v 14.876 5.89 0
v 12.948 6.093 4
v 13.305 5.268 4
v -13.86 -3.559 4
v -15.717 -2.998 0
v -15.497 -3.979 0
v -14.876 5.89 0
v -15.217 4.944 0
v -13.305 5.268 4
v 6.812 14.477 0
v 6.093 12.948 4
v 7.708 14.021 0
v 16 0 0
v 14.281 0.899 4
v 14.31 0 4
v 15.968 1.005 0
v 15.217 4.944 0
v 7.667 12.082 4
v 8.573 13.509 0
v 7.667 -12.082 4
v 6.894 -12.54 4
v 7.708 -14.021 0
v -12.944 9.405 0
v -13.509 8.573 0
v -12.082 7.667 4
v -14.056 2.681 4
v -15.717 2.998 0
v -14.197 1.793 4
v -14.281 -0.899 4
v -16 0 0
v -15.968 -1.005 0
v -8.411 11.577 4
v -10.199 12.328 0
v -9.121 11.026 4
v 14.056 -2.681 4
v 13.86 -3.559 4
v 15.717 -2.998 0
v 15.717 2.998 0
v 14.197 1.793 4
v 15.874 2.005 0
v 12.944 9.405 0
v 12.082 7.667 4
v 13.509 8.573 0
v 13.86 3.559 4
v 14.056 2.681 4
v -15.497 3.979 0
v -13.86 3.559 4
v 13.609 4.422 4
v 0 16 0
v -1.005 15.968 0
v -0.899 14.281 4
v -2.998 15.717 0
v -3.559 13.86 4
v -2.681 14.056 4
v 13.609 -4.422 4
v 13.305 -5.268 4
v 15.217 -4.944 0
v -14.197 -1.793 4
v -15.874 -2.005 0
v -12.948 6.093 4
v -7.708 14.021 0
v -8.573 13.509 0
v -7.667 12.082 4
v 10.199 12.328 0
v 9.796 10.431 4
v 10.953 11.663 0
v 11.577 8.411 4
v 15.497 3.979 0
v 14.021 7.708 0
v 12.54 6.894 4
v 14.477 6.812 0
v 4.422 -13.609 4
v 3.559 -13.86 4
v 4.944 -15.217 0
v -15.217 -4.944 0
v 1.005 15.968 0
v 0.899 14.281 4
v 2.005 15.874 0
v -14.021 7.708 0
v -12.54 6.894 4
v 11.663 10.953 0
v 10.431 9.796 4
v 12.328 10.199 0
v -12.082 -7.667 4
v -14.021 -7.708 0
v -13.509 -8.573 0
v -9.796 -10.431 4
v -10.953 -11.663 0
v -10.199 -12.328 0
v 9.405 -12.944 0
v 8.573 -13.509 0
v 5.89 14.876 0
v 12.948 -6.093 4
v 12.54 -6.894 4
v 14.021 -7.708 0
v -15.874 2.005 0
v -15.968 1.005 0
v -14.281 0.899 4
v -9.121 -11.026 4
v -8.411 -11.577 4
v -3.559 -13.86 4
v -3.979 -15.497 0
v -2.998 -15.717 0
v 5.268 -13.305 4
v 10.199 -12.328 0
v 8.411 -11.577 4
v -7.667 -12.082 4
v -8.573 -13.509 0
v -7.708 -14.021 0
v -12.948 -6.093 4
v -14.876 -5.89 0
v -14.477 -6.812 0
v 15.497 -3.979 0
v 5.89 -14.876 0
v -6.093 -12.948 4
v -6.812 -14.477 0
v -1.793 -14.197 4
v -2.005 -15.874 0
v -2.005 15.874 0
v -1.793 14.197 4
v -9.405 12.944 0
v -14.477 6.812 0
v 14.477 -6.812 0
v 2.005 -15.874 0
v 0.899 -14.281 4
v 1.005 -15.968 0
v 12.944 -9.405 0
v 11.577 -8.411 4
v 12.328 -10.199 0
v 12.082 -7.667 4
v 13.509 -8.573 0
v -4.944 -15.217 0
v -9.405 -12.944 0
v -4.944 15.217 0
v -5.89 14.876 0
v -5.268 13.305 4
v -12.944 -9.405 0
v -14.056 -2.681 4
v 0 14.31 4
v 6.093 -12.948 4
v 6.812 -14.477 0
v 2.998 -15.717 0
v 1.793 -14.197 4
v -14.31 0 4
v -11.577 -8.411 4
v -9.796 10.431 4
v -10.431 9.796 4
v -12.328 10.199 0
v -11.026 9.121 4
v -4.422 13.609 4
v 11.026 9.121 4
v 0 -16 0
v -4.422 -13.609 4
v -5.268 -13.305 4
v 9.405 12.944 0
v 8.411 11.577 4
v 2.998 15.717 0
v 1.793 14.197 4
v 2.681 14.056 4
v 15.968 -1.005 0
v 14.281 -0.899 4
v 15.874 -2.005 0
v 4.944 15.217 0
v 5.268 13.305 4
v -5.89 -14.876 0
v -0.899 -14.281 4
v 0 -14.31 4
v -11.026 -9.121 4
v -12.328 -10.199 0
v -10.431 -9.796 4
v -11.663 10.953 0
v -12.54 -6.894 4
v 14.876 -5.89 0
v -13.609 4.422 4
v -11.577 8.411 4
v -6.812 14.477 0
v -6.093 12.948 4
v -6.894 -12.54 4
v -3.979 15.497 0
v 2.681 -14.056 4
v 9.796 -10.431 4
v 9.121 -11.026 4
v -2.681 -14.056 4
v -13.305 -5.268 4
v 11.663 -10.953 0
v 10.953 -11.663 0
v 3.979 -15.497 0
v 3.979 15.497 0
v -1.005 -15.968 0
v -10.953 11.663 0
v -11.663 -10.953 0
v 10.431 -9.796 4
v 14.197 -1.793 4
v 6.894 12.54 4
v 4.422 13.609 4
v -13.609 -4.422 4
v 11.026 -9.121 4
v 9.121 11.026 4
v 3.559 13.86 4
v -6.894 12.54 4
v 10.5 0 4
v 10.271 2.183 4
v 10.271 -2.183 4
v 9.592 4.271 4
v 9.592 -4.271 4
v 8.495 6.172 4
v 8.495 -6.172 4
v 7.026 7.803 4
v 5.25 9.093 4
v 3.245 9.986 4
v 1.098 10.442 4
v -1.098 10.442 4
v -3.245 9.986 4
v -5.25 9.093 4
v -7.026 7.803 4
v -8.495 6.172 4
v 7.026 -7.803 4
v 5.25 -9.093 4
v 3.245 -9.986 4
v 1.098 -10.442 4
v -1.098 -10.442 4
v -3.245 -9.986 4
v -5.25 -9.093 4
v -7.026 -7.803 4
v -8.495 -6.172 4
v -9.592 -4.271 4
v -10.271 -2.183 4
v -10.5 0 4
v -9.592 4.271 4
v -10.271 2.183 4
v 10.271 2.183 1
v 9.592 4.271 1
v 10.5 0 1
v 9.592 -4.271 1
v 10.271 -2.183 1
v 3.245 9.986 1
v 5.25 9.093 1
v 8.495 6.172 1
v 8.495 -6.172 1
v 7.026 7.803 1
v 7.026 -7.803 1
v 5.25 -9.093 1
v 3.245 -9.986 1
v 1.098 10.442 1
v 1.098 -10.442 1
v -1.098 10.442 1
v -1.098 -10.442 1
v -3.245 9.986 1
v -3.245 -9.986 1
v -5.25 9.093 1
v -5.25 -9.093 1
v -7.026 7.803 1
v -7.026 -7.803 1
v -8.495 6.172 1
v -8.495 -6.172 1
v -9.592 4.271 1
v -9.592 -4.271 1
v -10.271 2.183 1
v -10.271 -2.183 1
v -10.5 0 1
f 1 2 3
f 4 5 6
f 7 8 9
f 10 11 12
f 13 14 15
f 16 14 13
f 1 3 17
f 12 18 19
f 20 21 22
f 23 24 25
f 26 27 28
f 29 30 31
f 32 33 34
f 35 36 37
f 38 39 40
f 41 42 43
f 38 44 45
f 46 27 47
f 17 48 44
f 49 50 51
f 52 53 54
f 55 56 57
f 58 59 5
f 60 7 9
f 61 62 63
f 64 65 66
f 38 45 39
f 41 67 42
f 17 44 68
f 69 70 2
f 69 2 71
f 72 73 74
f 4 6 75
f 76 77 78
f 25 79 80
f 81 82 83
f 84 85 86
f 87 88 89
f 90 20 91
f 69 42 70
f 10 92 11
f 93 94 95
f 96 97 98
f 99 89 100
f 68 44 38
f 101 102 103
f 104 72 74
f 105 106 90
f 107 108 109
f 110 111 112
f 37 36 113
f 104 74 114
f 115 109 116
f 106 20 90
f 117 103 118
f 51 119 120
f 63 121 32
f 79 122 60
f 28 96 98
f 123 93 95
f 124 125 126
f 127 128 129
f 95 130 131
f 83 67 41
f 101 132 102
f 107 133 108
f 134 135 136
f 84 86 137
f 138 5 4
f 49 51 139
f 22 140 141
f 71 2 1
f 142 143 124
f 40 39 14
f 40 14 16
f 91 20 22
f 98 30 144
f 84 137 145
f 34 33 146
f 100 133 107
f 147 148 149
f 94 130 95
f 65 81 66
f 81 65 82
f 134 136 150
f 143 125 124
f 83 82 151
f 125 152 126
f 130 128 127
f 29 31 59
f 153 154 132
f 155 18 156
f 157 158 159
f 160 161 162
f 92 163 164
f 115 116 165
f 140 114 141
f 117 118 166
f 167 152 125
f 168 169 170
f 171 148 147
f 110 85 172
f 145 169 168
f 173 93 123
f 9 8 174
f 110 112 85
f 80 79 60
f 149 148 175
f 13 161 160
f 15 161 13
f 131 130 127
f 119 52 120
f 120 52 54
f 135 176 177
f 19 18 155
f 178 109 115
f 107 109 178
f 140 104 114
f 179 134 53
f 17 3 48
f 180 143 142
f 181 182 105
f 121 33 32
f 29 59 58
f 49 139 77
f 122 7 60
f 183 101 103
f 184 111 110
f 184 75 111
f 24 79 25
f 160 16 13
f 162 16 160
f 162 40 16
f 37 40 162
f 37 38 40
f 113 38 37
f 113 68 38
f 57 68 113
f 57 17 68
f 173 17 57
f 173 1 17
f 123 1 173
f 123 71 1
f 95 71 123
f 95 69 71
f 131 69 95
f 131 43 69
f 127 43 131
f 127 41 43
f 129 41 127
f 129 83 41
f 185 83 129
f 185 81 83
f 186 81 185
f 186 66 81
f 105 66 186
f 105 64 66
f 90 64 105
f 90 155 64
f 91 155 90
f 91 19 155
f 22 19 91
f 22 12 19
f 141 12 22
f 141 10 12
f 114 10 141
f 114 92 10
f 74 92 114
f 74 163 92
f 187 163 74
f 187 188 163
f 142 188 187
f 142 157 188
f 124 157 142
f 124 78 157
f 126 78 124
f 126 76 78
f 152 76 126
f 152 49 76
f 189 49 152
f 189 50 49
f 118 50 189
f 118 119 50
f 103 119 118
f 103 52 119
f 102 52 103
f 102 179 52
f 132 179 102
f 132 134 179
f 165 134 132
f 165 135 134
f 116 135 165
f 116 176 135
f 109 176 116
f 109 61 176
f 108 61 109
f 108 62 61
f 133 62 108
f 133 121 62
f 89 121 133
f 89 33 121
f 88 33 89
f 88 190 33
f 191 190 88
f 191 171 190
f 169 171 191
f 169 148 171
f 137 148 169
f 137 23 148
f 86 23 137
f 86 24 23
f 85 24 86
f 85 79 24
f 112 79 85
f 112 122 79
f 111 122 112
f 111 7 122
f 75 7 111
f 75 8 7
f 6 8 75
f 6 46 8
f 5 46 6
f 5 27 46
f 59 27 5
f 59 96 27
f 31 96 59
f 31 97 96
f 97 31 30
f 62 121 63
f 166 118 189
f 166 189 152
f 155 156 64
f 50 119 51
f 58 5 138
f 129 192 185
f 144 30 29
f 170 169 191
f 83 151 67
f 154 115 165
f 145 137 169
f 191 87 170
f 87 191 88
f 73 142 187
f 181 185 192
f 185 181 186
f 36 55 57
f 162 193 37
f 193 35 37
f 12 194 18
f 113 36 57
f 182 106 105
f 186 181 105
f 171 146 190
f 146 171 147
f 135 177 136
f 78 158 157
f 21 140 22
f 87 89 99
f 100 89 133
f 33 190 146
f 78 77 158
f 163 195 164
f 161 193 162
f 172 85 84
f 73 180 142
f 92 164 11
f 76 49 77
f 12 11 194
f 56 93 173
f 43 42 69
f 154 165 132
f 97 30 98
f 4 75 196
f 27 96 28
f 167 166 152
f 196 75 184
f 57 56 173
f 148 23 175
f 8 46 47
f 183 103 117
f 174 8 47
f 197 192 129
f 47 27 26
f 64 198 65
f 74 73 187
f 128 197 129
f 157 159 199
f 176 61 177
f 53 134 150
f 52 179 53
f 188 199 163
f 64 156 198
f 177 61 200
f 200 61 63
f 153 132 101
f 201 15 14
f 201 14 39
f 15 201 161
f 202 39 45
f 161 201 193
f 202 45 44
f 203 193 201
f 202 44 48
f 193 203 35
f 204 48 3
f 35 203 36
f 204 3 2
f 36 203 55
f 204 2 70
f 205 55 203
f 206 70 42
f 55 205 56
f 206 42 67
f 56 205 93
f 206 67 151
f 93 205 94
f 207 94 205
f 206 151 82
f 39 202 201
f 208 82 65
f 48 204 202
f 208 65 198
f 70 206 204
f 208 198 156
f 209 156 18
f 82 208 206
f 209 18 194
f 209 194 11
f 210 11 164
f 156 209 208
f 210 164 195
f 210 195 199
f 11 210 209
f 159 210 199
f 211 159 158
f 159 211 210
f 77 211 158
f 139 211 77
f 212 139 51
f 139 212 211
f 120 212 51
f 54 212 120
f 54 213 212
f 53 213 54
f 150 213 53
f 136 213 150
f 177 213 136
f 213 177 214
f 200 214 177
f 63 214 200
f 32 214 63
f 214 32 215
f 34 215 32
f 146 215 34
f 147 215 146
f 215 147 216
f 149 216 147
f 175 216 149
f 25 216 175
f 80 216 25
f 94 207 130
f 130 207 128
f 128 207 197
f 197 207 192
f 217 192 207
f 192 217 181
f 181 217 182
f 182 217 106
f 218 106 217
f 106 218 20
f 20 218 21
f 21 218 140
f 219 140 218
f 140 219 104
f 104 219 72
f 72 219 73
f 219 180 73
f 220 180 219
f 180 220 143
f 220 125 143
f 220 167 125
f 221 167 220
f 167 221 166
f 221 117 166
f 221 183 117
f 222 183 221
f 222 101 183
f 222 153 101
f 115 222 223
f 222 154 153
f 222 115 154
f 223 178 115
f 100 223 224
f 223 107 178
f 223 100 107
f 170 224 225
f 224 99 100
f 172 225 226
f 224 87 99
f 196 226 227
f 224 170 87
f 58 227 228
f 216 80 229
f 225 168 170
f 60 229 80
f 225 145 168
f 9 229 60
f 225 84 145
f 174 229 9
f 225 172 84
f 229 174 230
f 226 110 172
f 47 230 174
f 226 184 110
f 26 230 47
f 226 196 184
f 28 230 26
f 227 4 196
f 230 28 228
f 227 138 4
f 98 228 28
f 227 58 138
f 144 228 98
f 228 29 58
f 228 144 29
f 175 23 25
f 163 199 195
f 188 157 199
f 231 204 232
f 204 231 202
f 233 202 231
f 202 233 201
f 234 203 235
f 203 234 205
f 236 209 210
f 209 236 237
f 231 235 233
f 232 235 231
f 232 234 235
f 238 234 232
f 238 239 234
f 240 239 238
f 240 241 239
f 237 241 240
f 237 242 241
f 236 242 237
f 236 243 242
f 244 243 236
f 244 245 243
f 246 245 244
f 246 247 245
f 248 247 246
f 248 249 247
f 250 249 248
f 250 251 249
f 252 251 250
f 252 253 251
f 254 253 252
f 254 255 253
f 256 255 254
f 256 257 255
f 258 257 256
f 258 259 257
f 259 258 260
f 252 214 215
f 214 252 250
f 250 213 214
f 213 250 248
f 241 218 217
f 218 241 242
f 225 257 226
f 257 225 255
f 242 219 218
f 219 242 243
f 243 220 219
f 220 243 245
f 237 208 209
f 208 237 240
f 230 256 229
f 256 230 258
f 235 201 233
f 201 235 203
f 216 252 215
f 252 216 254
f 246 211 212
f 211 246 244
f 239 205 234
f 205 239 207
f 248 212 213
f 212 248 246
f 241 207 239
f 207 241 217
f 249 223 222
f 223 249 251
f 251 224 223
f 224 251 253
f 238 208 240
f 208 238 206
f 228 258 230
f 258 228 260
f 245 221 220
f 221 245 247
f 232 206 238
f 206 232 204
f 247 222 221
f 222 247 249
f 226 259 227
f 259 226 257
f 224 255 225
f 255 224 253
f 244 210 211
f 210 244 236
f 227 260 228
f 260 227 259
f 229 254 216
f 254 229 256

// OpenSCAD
// Customizable Miniature Base
// Created by Rob Ross, February 2014
//
// Derived from the "Customizable Stone Wall"
// Created by Ari M. Diacou, January 2014
// Shared under Creative Commons License: Attribution-ShareAlike 3.0 Unported (CC BY-SA 3.0) 
// see http://creativecommons.org/licenses/by-sa/3.0/
//
// Notes:
// - "have_topper" option is not working.
// - good: 40mm, num_x = 4, stone_offset = 2, master_seed=41, z_compression=1.1

// preview[view:south east, tilt:bottom]

/* [Base] */
// Width of base at the bottom (mm)
base_width = 32; // [25:60]
// Total height of base (mm)
base_height = 4; // [2:5]
// Angle of sidewall (0 degrees is vertical)
base_angle = 25;


// Whether or not to include the stone topper [0:1]
have_topper = 0; // [0:No,1:Yes]

/* [Stones] */
// Relative length of a stone
U=3;
// Relative width of a stone
W=2;
// Approx. number of stones along floor at widest point
num_x=4;
// Height of stones above base body
topper_height = 0.75;
// A way to save the arrangement of stones

/* [Tweaks] */
master_seed=41;
// Higher angles make more wedge-shaped stones, lower angles produce blocks. Reccomend 5-30 (zero crashes).
maximum_rotation_angle=5;
// Higher rotation angles might need more compression
z_compression=1.1;
// Offset shifts the stones in the Y direction, can help in placement
stone_offset=2;
// Width of lip between top of base and start of stones (mm)
lip_width = 0.3;
// In mm, reduces dimensions of base bottom to help it fit inside base exterior.
slop = 0.2;

/* [Hidden] */

// This is Ari's old "thickness" parameter, which doesn't need to be configurable.
V=1;
//The wall height in number of stones can be derived from other parameters
num_z= ceil(num_x / W * U);

// Split determines whether to bother to split the base into parts or not
split = 0;


/**** Main Routines ****/

difference() {
   base_exterior();
   translate([0,0,1]) cylinder(r=10.5,h=4);
}

// base_exterior() - angled sides and top of base
module base_exterior()
{
	difference() {
		cylinder($fn=100, r1 = base_width / 2, 
			r2 = base_width / 2 -  base_height *sin(base_angle),
			h = base_height - have_topper * topper_height);
		if (split) {
			cylinder(r=base_width/2 - base_height * sin(base_angle) - 1,
				h = base_height - 1);	
		}
	}
}

// base_bottom() - flat bottom of base with space for magnets, etc.
module base_bottom()
{
	difference() {
		cylinder(r=base_width/2 - base_height * sin(base_angle) - 1 - slop/2,
			h = base_height - 1 - slop);
		translate([0,0,1]) cylinder(r=base_width/2 - base_height * sin(base_angle) - 2 - slop/2,
			h = base_height - 1 - slop);
	}
}

// topper() -- generates the flagstone topper using the raw_flagstones() module below.
module topper()
{
//	intersection() {
		translate([0,stone_offset,2]) rotate([-90,0,0]) raw_flagstones(base_width + 5);
//		translate([base_width / 2, base_width / 2, base_height - have_topper * topper_height]) 
%			cylinder(r=base_width/2 - base_height * sin(base_angle) - lip_width,
				h = topper_height);
//	}
}

// raw_flagstones() -- generates the floor of flagstones; used to be wall() in Ari's
//                     original version of this code.
module raw_flagstones(width) {
	dimensions=[U,V,W];
	half_dimensions=[U/2,V,W];

	scalefactor = width / (W * num_z);
	scale([scalefactor, scalefactor, scalefactor]) 
	union(){
			for(z=[0:num_z-1]){
				for(x=[0:num_x-1 + 1]){
						translate([U*(x+0.5-0.25*(1+pow(-1,z))), 0,z*W*z_compression]) 
							color("SlateGray")
								rock(dimensions,maximum_rotation_angle,num_x*z+x);
					}
				}
		}
}

// rock() -- generates a rock at origin. Slight adjustment (bug fix?) from Ari's version.
module rock(unit_dimension, max_rotation, seed)
{
	rotation_vector=rands(-max_rotation,max_rotation,3*3,seed*1000*master_seed);
	//echo( "rotation_vector: ",rotation_vector);
	intersection()
	{
		rotate([rotation_vector[1],rotation_vector[1+1],rotation_vector[1+2]]) 
			cube(unit_dimension,center=true);
		rotate([rotation_vector[4],rotation_vector[4+1],rotation_vector[4+2]]) 
			cube(unit_dimension,center=true);
		rotate([rotation_vector[7],rotation_vector[7+1],rotation_vector[7+2]]) 
			cube(unit_dimension,center=true);
	}
}
